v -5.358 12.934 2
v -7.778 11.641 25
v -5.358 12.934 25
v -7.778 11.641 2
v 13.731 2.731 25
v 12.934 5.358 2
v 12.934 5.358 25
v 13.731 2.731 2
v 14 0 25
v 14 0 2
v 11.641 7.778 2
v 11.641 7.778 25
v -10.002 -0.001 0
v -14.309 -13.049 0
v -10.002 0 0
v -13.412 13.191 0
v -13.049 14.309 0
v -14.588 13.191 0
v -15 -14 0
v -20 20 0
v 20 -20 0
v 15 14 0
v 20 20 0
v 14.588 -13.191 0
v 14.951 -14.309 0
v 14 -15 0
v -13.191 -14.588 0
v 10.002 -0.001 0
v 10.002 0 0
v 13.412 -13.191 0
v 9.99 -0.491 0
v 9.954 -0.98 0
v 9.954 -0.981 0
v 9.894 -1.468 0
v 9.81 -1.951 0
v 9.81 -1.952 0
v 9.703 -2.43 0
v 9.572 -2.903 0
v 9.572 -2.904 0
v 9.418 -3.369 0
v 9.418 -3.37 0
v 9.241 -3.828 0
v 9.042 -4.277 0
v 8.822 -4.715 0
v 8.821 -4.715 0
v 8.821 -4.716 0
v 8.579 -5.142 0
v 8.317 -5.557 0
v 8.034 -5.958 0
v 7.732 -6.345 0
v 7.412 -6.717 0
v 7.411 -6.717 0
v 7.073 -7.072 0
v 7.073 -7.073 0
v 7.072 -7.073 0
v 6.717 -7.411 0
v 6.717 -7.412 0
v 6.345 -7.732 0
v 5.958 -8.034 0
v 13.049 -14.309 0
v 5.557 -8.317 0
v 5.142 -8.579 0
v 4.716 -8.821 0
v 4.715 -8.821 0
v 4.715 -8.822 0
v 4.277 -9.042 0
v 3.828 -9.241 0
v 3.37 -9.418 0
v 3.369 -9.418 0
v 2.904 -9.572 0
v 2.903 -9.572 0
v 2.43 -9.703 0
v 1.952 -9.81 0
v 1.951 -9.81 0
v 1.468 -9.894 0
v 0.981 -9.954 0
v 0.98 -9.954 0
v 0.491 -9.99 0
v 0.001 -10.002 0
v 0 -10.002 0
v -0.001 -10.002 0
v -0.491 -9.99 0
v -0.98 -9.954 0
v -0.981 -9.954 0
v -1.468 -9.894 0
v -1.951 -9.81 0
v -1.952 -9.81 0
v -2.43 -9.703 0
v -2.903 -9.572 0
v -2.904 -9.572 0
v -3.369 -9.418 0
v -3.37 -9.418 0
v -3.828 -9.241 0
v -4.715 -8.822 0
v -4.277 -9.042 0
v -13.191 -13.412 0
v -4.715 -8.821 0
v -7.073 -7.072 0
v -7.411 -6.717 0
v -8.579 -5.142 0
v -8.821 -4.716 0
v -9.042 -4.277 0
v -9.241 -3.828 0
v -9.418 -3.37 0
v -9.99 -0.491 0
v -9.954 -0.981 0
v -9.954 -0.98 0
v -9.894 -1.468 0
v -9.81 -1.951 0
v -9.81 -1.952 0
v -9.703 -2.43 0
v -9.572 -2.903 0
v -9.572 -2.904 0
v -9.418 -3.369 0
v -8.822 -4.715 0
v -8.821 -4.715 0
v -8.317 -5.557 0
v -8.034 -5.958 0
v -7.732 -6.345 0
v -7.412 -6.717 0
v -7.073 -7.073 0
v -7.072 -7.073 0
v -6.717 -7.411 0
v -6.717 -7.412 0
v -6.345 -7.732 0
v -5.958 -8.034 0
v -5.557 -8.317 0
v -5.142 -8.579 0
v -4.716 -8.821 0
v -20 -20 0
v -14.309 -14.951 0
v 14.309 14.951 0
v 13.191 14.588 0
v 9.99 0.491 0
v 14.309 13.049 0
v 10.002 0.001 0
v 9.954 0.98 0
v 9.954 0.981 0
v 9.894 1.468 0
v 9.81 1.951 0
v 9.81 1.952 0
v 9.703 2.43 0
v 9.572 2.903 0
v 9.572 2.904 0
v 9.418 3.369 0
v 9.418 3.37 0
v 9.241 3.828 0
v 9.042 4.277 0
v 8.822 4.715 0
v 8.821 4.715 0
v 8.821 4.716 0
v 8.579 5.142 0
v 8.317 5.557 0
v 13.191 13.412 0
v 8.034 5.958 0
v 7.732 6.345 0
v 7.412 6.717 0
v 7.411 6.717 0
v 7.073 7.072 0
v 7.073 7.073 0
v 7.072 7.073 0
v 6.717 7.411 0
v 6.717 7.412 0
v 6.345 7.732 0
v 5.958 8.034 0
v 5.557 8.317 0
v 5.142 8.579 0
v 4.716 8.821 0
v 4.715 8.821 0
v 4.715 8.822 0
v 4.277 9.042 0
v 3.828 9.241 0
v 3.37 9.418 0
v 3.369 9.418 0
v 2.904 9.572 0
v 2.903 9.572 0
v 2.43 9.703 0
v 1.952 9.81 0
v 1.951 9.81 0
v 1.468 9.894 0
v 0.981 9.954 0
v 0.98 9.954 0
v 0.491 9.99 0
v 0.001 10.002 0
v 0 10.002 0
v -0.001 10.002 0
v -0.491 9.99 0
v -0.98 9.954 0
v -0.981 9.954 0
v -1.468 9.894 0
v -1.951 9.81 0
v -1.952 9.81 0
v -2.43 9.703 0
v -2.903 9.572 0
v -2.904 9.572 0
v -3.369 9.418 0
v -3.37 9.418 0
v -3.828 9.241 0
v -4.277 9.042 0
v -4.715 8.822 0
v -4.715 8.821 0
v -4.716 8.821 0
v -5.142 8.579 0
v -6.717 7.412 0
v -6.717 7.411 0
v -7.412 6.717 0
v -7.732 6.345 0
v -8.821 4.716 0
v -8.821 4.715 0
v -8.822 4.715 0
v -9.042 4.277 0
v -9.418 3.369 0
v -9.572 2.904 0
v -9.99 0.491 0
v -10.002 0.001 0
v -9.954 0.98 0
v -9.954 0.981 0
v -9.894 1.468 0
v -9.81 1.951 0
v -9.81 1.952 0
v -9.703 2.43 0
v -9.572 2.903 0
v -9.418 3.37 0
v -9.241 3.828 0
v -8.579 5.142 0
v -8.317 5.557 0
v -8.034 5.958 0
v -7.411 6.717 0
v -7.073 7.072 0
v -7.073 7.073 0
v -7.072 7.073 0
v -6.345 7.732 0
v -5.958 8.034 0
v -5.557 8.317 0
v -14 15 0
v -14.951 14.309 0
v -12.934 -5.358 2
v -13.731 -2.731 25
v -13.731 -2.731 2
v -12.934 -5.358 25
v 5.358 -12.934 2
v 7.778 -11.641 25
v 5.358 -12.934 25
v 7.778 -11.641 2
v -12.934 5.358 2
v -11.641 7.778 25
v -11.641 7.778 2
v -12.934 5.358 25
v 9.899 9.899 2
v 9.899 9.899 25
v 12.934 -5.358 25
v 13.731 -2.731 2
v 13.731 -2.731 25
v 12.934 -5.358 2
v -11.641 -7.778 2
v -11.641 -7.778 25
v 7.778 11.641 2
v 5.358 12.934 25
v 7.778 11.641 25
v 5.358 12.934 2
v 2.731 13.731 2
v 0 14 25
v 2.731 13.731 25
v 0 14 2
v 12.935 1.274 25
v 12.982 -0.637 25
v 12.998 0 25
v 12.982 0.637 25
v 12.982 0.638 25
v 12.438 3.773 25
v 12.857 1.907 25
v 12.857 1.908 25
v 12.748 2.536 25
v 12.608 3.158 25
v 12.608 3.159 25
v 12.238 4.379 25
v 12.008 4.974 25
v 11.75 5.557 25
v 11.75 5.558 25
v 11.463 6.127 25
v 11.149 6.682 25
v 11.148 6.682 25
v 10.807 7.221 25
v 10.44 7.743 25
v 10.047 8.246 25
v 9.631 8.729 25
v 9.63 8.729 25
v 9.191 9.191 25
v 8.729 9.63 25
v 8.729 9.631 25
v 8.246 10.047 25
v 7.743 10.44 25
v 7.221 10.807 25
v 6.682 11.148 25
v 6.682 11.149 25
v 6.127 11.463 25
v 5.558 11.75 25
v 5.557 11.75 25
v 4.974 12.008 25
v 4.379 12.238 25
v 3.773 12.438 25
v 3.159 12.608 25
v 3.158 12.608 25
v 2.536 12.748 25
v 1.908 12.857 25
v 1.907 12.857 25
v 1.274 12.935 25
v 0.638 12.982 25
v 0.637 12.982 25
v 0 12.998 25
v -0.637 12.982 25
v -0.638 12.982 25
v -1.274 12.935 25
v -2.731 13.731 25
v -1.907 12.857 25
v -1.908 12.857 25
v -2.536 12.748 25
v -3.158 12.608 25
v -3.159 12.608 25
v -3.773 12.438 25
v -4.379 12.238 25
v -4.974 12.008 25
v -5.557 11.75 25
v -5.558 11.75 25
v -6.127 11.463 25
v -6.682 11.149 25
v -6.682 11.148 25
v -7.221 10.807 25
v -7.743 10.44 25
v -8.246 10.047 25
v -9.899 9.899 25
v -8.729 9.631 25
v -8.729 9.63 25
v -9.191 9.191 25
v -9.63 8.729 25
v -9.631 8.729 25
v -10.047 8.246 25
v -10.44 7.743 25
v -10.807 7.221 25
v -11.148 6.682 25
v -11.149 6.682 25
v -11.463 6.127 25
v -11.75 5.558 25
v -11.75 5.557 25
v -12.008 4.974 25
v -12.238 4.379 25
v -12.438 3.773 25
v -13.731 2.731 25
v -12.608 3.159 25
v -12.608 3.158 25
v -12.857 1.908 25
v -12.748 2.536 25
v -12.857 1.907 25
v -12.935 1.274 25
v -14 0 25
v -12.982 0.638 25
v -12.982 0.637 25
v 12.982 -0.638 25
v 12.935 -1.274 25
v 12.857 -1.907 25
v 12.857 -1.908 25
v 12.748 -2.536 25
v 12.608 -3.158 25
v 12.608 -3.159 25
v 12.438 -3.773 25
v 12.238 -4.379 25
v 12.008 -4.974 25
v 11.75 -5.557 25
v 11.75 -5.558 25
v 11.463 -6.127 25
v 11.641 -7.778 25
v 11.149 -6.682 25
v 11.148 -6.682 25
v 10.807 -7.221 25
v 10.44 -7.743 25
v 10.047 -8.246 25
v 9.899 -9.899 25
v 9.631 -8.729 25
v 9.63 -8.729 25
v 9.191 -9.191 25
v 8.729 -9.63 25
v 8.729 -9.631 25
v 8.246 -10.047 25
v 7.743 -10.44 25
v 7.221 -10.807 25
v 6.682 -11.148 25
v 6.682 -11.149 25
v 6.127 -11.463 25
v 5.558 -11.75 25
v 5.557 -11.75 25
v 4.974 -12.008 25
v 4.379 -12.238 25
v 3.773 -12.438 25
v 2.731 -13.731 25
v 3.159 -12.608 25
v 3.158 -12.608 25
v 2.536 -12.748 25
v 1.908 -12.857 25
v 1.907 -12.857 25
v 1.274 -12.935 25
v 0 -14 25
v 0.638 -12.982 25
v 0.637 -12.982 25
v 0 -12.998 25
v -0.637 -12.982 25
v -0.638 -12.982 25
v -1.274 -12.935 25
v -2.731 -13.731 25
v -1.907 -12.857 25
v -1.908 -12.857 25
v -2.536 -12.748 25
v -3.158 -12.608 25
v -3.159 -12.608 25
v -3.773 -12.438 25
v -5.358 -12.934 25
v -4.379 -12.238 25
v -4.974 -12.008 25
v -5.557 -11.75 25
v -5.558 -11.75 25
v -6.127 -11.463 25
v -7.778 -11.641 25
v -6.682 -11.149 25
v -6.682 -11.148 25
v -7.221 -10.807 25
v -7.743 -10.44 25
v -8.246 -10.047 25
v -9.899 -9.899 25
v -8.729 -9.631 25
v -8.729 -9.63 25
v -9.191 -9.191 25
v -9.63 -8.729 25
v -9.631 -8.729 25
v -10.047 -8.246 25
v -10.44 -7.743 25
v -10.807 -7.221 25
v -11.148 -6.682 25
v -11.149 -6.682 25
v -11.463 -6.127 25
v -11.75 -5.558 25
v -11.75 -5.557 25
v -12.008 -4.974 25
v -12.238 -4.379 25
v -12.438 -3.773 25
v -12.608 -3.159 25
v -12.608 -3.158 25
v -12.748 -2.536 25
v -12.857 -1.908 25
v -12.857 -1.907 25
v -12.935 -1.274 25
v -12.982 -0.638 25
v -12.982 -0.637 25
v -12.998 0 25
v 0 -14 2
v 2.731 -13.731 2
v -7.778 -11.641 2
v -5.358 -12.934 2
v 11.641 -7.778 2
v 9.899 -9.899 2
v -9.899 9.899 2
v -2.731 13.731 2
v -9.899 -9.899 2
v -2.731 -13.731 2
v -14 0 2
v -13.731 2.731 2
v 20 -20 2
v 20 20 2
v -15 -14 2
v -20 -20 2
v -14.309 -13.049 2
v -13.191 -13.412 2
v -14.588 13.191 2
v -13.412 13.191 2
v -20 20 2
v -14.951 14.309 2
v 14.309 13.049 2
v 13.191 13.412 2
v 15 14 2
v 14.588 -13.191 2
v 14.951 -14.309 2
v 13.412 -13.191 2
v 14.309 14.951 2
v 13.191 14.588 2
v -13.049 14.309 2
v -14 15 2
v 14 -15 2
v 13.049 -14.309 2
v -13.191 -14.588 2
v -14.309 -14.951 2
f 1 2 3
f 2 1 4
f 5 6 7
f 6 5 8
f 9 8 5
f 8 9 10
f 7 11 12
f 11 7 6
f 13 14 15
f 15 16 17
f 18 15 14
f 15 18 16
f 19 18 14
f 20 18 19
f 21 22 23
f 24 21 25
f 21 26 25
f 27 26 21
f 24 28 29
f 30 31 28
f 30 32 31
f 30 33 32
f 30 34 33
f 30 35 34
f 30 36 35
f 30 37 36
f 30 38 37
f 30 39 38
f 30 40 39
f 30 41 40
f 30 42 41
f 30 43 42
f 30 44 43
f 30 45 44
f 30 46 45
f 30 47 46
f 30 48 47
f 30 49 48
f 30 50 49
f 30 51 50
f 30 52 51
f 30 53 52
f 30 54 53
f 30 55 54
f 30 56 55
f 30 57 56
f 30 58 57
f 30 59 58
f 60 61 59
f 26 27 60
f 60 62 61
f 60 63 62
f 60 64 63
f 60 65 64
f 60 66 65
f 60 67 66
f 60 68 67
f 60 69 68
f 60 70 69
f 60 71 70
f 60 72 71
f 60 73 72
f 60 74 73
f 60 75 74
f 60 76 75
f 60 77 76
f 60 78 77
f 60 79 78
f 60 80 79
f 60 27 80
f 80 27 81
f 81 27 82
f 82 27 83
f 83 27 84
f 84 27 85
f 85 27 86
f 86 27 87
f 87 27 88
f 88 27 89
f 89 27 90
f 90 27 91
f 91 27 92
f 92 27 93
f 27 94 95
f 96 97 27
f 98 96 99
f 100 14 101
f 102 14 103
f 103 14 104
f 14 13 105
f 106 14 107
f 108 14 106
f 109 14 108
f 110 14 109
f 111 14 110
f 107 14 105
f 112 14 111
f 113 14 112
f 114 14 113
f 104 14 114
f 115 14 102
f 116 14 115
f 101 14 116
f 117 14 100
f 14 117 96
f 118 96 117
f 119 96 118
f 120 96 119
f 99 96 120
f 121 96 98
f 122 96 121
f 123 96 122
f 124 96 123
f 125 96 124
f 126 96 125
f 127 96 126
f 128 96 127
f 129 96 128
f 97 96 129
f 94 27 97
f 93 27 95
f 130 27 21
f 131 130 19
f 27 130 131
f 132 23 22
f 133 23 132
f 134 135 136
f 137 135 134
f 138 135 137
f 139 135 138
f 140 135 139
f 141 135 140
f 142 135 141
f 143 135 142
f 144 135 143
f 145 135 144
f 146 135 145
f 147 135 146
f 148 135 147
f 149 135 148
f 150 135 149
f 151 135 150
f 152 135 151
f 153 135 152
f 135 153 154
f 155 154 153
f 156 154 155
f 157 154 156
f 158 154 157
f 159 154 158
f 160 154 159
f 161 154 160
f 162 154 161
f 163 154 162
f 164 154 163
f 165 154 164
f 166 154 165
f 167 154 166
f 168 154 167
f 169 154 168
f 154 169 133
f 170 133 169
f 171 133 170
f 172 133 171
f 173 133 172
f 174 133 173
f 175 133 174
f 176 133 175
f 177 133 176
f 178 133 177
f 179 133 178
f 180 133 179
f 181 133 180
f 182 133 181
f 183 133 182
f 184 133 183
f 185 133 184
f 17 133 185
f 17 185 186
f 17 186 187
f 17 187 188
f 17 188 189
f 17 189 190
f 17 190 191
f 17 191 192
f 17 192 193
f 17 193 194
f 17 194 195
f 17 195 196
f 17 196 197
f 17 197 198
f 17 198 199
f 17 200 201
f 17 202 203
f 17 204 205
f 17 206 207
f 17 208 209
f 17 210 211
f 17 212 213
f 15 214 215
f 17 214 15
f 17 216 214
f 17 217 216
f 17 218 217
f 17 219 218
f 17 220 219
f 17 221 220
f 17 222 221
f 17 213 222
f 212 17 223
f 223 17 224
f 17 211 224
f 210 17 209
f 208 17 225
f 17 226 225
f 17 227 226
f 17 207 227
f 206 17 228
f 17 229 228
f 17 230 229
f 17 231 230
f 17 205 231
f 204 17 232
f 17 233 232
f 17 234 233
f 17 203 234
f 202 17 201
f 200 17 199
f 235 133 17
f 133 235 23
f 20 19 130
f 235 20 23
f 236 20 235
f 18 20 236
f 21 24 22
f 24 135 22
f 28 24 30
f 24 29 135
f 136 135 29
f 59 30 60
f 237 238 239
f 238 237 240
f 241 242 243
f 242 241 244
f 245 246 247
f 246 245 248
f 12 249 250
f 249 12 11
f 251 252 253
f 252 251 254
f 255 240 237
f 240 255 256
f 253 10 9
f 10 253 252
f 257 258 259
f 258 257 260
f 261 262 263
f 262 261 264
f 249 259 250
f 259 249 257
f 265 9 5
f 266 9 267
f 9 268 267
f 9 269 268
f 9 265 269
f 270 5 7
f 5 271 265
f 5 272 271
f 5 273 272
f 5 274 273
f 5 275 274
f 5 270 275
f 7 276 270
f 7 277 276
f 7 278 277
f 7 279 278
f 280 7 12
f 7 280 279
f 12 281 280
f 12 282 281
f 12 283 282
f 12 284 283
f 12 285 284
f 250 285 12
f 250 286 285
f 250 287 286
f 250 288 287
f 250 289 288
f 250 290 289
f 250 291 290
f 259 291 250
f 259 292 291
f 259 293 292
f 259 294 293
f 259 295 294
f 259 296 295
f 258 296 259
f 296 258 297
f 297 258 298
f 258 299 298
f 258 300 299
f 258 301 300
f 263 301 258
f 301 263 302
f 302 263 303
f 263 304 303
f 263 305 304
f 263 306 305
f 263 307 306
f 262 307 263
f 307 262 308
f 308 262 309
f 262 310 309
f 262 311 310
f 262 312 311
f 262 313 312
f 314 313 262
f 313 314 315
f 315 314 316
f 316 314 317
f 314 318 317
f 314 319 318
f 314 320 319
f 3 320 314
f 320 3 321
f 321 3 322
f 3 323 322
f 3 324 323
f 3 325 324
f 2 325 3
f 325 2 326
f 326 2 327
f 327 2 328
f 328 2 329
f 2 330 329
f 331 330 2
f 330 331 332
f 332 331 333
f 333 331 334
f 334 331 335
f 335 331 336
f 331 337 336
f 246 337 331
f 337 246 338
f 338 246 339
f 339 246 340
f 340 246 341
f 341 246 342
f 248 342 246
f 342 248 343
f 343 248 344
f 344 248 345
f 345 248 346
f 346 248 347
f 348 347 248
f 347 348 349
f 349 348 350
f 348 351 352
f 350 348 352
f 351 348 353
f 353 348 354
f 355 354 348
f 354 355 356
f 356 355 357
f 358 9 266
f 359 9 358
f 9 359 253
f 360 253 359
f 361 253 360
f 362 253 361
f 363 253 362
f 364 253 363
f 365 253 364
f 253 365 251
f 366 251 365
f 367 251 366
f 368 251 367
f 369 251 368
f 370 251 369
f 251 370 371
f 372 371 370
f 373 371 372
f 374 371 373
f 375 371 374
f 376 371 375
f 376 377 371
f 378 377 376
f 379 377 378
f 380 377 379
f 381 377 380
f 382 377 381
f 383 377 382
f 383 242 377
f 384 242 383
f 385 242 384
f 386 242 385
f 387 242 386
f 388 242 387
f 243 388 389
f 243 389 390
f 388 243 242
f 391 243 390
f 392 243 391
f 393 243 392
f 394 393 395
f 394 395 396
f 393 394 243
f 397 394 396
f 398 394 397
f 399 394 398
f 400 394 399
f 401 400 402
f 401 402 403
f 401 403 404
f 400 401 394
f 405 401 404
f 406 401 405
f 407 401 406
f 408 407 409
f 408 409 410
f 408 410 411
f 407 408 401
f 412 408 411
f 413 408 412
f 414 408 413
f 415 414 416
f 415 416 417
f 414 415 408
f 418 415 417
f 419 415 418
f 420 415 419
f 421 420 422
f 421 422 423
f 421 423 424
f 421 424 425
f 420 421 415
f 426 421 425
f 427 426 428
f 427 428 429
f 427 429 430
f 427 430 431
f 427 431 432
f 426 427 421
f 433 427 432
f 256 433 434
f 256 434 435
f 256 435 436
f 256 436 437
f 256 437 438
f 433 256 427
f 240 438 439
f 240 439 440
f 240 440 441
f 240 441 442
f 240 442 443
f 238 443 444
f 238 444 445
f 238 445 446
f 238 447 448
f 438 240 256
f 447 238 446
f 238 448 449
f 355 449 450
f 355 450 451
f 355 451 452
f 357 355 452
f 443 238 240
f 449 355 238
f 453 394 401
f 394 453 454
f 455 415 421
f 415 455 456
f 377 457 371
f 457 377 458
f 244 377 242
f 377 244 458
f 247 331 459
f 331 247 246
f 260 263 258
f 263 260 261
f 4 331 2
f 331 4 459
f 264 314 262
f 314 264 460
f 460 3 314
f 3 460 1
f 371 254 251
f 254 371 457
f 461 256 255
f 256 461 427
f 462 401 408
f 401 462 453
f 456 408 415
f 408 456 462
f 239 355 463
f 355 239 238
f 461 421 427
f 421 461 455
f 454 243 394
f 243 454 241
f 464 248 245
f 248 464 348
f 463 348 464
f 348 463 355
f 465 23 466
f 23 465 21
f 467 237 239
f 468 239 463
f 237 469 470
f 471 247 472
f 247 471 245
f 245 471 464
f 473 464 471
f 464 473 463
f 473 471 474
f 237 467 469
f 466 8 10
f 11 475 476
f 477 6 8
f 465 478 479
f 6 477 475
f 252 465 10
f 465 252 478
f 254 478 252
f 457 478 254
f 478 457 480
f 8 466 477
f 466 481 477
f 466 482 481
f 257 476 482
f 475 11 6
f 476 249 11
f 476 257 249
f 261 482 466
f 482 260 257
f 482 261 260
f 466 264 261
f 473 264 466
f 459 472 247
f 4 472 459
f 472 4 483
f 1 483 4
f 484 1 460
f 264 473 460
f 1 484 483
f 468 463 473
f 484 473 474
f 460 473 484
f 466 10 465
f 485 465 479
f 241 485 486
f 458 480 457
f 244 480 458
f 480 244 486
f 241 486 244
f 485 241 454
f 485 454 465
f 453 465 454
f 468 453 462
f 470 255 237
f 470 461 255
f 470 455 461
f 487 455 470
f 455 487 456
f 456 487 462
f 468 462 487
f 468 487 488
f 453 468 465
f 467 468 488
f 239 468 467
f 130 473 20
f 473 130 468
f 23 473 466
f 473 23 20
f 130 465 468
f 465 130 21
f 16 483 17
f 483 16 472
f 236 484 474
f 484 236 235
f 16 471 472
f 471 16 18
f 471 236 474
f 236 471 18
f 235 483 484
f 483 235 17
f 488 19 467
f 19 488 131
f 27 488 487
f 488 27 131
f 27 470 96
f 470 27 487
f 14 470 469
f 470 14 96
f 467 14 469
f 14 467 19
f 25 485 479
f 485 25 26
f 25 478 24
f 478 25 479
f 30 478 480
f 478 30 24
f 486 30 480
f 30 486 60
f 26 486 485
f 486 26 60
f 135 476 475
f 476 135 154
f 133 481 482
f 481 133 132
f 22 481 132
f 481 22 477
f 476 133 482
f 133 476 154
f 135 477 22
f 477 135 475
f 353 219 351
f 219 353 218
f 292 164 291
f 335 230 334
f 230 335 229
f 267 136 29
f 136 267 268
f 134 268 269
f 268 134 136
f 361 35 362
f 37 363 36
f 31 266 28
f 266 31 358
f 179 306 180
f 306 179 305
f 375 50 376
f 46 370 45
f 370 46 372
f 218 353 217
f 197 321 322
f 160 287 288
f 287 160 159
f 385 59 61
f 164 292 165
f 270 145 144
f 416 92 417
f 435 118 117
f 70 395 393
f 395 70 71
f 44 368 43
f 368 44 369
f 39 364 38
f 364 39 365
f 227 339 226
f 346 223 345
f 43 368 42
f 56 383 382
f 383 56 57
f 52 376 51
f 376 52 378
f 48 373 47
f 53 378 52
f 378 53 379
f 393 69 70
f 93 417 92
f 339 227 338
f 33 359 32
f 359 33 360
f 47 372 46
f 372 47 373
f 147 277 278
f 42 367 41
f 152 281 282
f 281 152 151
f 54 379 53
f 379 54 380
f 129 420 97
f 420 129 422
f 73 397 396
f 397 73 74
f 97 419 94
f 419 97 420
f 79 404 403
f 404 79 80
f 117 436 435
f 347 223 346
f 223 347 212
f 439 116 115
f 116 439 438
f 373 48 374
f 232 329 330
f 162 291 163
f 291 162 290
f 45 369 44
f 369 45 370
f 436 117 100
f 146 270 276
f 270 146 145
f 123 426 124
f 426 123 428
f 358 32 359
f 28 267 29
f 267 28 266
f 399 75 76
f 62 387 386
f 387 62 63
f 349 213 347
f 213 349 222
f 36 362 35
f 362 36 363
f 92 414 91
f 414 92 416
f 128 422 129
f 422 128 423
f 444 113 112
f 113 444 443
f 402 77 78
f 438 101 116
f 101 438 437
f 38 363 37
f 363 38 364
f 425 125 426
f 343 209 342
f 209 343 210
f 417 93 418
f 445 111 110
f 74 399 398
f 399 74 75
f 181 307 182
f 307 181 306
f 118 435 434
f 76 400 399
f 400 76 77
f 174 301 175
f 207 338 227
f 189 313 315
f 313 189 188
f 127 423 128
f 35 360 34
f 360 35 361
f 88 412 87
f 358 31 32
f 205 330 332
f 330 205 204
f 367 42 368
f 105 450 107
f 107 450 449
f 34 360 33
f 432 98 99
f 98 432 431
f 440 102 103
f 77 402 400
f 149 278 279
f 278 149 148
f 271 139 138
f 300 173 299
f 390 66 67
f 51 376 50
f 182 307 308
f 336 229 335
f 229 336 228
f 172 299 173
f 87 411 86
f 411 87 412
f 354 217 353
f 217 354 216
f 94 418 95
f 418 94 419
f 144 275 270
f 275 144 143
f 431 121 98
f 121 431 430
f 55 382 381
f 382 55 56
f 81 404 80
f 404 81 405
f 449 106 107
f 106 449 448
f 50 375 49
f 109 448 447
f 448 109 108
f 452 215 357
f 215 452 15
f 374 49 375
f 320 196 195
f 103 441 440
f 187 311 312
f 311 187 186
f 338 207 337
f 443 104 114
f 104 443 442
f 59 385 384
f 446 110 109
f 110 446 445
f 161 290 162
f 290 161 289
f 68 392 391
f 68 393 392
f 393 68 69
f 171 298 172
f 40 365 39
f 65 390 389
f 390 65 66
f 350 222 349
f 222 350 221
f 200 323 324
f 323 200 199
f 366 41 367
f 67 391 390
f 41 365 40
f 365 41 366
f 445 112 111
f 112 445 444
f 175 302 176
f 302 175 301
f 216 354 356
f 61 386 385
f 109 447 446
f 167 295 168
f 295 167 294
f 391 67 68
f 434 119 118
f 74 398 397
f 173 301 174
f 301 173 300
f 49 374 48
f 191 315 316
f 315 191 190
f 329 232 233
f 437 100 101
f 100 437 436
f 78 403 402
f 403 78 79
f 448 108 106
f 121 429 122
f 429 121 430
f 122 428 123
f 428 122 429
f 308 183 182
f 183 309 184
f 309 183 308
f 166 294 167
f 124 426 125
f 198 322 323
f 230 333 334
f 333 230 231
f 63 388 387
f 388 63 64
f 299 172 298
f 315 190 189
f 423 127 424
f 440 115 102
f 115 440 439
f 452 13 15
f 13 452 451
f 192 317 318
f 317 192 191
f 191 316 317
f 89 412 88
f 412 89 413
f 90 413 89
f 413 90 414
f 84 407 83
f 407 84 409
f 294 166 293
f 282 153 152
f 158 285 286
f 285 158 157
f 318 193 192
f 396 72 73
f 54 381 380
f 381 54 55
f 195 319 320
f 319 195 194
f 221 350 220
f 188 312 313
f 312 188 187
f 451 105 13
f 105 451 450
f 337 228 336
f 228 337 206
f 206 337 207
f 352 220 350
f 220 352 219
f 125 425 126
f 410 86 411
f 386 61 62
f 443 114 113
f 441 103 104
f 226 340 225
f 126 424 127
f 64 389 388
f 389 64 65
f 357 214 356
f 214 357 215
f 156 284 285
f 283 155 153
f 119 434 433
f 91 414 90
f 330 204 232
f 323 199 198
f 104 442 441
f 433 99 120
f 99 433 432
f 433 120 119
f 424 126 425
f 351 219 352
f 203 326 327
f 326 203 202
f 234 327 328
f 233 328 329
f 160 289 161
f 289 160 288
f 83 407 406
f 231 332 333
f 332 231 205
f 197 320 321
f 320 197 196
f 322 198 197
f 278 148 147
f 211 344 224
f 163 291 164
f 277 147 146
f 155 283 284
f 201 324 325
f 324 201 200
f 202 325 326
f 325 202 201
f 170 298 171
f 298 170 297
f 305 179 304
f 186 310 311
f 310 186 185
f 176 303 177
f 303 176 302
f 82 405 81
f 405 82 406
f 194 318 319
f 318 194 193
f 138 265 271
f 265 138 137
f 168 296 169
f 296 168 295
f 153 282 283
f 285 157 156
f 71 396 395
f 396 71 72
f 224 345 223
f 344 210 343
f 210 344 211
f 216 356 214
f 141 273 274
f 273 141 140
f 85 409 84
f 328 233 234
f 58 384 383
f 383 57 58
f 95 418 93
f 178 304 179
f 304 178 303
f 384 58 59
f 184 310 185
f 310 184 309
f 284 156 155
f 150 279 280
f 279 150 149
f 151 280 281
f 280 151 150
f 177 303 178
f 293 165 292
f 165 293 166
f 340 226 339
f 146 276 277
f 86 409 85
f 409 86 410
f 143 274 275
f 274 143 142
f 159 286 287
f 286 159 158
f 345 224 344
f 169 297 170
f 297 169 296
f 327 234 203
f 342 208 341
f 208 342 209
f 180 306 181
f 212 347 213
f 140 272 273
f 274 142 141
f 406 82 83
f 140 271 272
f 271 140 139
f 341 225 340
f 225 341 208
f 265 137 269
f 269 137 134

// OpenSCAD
// Parameters
	ext=0.1;
	eps=0.02;

	bLid = 0;
	bCup = 1;
	bStand = 0;


	hPlug = 25;
	wStand = 40;

// Modules
	module bore_holes(){
		for(i=[1:4]){
				rotate([0, 0, 90*i]) 
				translate([wStand*0.35, wStand*0.35, 0])
				#cylinder(r=1, h=10, center=true);
			}	
	}
	module needle_holes(){
		for(x=dPorts*[-1, 1], y=dPorts*[-1,1])
			translate([x,y,0])
			cylinder(r=2/2+ext, h=50, center=true, $fn=12);
	}

// LID
	if(bLid){
		translate([0, 0, hPlug + 2/2])
		difference() {
			cube(size=[wStand, wStand, 2], center=true);
			needle_holes();
		}
		
	}

// CUP
	if(bCup){
		difference() {
			union() {
				// outer shell
				cylinder(r=28/2, h=hPlug, $fn=32);
				translate([0, 0, 1])
				//base
				cube(size=[wStand, wStand, 2], center=true);
			}
			
			// inner cone
			translate([0, 0, -eps])
			#cylinder(r1=20/2, r2=26/2, h=25+2*eps, $fn=128);

			bore_holes();	
		}
	}	

// STAND
	dPorts = 4.5;
	hStand = 30;
	if(bStand){

		translate([0, 0, -hStand/2])
		difference() {
			cube(size=[wStand, wStand, hStand], center=true);

			needle_holes();
			bore_holes();	
		}
	}
